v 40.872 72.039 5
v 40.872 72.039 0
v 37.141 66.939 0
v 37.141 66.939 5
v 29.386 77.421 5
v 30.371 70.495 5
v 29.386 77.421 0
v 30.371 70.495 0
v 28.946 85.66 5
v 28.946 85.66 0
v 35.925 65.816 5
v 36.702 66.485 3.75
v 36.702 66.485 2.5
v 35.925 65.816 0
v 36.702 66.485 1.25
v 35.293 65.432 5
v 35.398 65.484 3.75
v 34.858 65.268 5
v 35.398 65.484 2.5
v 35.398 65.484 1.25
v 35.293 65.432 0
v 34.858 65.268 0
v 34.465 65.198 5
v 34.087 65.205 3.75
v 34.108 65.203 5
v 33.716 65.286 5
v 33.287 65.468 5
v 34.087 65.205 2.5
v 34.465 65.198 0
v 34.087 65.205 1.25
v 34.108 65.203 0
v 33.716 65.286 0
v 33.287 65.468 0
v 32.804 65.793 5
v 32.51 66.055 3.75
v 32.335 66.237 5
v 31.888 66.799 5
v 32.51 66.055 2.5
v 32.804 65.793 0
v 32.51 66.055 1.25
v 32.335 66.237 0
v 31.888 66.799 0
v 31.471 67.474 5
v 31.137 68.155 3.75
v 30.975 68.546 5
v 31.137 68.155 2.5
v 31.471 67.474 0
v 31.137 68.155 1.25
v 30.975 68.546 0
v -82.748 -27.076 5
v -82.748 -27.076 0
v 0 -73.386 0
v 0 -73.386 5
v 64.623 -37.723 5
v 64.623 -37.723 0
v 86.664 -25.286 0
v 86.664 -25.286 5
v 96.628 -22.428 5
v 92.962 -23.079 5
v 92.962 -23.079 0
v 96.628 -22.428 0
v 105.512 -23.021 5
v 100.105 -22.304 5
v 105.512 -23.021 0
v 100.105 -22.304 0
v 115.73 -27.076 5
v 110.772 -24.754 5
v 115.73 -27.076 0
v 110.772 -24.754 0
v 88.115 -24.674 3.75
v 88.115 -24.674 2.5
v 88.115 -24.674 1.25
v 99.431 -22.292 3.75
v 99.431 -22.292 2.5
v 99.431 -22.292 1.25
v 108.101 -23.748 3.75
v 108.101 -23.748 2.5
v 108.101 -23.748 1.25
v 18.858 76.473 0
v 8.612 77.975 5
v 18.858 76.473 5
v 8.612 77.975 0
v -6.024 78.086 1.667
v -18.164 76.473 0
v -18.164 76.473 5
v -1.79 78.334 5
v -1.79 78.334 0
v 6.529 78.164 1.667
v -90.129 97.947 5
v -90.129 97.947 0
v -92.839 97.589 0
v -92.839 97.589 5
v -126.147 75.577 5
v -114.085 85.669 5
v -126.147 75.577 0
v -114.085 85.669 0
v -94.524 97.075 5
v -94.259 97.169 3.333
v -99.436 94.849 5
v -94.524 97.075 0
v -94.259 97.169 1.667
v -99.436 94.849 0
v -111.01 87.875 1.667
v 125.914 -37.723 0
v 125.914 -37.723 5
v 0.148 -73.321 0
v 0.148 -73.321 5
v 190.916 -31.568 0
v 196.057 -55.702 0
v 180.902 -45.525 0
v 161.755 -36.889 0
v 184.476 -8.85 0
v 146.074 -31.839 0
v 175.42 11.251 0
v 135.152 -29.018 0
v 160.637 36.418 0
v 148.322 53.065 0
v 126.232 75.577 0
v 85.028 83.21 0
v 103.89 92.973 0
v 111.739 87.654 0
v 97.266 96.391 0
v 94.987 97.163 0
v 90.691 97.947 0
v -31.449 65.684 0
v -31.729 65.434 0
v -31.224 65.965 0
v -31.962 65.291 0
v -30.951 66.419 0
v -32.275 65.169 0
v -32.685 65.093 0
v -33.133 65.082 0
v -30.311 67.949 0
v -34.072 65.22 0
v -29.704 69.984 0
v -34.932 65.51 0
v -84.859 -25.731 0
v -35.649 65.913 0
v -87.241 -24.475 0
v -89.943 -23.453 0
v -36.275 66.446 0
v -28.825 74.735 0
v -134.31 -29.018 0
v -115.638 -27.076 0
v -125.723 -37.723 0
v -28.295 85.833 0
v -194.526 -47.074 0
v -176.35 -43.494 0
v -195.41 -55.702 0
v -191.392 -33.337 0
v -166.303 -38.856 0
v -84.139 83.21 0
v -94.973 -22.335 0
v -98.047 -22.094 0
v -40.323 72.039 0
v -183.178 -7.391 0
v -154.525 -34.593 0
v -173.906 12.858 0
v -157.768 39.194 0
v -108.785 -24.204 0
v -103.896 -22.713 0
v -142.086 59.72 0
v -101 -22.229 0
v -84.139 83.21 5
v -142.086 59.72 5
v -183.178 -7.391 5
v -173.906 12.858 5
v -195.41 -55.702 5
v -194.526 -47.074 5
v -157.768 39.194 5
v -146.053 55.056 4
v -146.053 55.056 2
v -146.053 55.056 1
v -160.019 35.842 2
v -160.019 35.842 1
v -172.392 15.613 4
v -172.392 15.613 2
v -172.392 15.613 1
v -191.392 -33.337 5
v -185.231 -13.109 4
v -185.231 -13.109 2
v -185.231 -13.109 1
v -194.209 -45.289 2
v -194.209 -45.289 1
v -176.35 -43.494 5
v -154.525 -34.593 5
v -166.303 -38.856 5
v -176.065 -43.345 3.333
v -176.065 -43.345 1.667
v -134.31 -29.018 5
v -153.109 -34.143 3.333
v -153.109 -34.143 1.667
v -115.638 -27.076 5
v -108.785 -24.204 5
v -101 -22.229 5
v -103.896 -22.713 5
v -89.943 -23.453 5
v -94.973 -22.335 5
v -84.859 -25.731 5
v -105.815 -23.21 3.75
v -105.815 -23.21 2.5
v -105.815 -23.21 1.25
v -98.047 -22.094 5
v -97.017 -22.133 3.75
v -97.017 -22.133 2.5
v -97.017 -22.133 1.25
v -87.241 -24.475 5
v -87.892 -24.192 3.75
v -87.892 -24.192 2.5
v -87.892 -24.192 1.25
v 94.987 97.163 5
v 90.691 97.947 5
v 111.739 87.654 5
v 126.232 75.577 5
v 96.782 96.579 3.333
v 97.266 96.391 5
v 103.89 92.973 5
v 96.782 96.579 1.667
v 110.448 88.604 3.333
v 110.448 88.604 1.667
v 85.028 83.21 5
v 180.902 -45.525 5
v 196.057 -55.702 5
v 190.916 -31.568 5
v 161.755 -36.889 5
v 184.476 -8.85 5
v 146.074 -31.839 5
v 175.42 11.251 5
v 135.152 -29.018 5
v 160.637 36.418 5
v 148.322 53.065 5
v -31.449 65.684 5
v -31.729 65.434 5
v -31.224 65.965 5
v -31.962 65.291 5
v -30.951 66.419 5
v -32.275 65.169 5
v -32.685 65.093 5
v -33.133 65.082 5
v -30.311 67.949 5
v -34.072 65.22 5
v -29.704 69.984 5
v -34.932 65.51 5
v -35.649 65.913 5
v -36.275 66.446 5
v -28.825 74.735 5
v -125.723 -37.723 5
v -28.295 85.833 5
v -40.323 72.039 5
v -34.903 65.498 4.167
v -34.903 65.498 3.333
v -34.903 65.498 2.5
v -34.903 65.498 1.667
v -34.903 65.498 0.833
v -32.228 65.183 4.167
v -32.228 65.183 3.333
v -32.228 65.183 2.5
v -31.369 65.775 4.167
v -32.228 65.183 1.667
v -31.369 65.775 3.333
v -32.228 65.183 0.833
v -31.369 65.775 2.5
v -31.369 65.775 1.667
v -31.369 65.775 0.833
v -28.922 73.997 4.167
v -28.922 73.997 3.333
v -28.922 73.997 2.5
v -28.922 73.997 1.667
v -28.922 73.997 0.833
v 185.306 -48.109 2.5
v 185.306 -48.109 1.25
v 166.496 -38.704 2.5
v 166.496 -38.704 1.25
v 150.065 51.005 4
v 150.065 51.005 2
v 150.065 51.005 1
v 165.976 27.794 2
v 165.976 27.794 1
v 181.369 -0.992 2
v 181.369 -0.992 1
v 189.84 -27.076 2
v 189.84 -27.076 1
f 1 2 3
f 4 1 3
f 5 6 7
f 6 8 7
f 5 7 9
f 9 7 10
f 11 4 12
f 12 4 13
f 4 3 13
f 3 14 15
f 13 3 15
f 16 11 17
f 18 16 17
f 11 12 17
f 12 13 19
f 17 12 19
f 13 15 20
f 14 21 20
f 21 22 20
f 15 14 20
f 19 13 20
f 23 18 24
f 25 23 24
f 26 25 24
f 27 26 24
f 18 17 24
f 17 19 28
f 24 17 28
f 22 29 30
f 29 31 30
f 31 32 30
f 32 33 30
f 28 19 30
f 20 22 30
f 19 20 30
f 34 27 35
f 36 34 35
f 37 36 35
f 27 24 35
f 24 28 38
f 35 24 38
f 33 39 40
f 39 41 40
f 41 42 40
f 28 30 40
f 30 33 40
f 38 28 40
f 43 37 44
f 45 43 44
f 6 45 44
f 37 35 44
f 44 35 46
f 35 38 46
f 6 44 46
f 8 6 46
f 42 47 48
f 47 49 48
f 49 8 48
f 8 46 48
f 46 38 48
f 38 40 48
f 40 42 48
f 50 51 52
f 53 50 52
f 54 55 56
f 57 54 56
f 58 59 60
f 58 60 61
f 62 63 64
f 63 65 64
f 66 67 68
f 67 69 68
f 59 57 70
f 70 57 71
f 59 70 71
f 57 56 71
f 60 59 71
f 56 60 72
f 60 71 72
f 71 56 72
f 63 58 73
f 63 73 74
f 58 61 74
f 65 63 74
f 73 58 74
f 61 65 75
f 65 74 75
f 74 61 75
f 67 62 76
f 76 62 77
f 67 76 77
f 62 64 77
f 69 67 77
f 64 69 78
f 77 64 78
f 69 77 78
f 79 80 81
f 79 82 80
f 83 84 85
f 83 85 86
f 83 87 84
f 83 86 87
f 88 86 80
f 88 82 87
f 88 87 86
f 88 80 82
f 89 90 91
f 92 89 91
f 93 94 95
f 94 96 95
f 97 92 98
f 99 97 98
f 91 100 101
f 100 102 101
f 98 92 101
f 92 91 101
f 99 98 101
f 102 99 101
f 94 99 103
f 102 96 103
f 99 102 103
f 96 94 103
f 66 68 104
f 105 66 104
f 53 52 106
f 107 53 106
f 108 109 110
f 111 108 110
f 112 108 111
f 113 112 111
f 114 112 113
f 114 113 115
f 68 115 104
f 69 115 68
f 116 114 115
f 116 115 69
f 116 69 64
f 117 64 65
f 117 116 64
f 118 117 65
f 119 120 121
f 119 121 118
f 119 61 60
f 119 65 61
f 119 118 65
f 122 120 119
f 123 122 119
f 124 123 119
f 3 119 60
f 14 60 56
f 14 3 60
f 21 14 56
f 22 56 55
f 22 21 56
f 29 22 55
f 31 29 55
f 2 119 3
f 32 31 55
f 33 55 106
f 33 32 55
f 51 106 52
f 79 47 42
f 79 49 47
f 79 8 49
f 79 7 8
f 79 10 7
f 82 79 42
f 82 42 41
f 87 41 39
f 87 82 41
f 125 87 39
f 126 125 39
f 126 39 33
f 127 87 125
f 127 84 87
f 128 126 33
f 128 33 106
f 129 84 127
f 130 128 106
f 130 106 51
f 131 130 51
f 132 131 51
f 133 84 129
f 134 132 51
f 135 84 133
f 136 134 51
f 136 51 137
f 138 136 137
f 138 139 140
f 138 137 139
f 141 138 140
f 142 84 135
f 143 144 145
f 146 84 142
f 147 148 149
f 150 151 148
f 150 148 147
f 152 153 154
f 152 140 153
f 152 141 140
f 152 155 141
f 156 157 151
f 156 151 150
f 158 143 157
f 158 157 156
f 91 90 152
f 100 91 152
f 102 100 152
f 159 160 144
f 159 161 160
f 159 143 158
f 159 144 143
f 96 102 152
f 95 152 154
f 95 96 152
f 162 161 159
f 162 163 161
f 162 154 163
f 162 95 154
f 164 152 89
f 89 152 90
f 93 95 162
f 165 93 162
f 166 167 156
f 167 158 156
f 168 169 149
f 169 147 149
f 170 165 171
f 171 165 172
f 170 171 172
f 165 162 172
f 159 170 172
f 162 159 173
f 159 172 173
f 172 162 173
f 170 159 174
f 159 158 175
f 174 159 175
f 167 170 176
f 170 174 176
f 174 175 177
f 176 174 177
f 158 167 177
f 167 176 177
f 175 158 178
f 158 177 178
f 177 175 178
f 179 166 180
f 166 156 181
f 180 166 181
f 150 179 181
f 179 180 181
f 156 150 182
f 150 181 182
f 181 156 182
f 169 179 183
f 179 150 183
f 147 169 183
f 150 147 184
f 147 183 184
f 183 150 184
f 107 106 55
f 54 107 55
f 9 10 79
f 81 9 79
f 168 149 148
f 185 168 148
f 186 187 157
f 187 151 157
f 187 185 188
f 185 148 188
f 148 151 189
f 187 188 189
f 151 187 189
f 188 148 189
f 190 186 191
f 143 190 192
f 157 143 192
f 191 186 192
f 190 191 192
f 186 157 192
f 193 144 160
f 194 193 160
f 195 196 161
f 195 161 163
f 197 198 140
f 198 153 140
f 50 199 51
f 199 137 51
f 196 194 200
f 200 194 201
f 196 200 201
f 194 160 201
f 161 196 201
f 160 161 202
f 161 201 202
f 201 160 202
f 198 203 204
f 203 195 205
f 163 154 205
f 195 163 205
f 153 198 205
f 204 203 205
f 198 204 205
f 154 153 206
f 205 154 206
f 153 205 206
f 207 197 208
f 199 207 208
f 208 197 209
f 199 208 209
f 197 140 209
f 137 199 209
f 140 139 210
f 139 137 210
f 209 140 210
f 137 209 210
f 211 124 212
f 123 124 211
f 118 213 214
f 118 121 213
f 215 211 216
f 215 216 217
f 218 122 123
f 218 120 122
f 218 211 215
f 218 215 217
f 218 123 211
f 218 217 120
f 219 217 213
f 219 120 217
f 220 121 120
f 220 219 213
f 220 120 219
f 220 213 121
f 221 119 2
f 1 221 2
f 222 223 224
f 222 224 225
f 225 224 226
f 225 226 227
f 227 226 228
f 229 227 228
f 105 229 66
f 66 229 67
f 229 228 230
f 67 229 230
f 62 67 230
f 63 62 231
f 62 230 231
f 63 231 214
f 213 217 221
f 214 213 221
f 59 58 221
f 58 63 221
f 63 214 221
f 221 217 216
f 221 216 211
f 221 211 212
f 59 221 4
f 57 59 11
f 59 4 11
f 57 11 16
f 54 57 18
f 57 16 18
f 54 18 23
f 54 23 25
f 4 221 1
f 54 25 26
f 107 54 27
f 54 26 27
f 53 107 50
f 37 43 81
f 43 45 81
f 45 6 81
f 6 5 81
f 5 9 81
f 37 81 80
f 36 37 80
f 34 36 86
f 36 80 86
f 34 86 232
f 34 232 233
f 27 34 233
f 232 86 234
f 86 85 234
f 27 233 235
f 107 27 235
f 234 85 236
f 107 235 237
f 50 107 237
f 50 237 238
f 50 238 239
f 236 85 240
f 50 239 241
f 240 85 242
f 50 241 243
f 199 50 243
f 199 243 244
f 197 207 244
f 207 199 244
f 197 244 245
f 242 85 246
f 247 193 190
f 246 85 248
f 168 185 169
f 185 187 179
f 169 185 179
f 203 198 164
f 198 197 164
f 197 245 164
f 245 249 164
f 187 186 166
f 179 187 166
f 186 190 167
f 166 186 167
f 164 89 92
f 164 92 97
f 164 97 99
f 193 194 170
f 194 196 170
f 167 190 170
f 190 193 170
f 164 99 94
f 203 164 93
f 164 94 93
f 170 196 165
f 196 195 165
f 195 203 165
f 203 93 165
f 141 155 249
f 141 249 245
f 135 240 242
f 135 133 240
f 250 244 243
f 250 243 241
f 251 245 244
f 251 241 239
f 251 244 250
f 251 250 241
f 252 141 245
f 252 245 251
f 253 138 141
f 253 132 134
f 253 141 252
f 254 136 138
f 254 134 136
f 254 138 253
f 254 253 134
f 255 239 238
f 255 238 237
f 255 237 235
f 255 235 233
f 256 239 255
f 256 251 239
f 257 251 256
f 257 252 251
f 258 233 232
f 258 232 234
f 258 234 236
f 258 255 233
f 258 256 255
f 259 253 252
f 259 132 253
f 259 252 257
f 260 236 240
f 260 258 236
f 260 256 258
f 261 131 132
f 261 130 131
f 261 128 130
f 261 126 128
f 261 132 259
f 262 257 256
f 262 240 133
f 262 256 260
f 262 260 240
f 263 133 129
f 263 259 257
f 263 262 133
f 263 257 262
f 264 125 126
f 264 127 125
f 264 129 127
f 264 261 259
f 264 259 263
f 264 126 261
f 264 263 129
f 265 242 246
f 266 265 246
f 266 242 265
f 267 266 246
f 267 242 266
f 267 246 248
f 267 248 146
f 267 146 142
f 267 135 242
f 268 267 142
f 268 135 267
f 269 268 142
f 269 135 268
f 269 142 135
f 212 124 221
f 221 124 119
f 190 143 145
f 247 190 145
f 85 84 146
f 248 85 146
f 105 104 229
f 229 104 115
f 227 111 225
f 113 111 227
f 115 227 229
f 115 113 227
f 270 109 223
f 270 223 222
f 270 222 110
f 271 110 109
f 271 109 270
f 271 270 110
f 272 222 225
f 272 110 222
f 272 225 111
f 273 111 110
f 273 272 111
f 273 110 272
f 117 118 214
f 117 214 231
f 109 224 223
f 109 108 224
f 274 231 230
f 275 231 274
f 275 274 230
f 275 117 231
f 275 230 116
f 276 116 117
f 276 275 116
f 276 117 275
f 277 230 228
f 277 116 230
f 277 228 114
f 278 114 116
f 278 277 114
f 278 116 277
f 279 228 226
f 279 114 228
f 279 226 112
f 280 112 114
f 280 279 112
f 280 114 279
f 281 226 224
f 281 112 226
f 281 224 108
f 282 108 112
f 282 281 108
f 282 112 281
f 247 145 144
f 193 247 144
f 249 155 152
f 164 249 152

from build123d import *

# Parameters (mm, degrees)
F1_DEPTH = 5


with BuildPart() as f1:
    # F0 (on Top) → F1 (new body)
    with BuildSketch(Plane.XY):
        with BuildLine():
            add(Edge.make_bspline(
                [(90.6907990575, 97.9469045997), (92.5506797048, 97.7076608643), (97.3714835458, 97.0875419767), (111.3982823465, 88.6117833473), (121.080150162, 80.1037886779), (126.2320578098, 75.5765214562)],
                knots=[0, 0, 0, 0, 0.2271401523, 0.5887464448, 1, 1, 1, 1], degree=3))
            Line((90.6907990575, 97.9469045997), (85.0284695625, 83.2098796964))
            Line((85.0284695625, 83.2098796964), (40.8717952669, 72.0387473702))
            add(Edge.make_bspline(
                [(40.8717952669, 72.0387473702), (39.4639939865, 69.9245000162), (37.1445701485, 66.4411705287), (33.9493519923, 64.4696102192), (29.6565838044, 68.4823153989), (29.2317022817, 78.7511303066), (28.945825994, 85.6603756547)],
                knots=[0, 0, 0, 0, 0.2489757455, 0.4102001378, 0.6031604435, 1, 1, 1, 1], degree=3))
            Line((28.945825994, 85.6603756547), (18.8582092524, 76.4733627439))
            add(Edge.make_bspline(
                [(-18.1637965143, 76.4733627439), (-14.1437358291, 77.1075253303), (-6.0536026016, 78.3837398489), (6.5737675387, 78.534699391), (14.7693251616, 77.1594799333), (18.8582092524, 76.4733627439)],
                knots=[0, 0, 0, 0, 0.331071517, 0.6662617533, 1, 1, 1, 1], degree=3))
            Line((-18.1637965143, 76.4733627439), (-28.2951612025, 85.8325883746))
            add(Edge.make_bspline(
                [(-40.3230860829, 72.0387473702), (-39.088224818, 70.1720803209), (-37.0503190798, 67.0914982353), (-35.1522700417, 65.3354549205), (-31.9776770355, 64.7647193737), (-30.3977678177, 67.0311278125), (-28.4521818074, 74.4454913779), (-28.3514925601, 81.747451692), (-28.2951612025, 85.8325883746)],
                knots=[0, 0, 0, 0, 0.183795483, 0.303319798, 0.4263136272, 0.5389125099, 0.7420411316, 1, 1, 1, 1], degree=3))
            Line((-40.3230860829, 72.0387473702), (-84.1391906142, 83.2098796964))
            Line((-84.1391906142, 83.2098796964), (-90.1290997863, 97.9469045997))
            add(Edge.make_bspline(
                [(-90.1290997863, 97.9469045997), (-91.2780209136, 97.8755945292), (-94.8799122656, 97.6520359926), (-112.2832793798, 87.9203392551), (-121.5116369775, 79.7034292861), (-126.1465400457, 75.5765214562)],
                knots=[0, 0, 0, 0, 0.1890607113, 0.5927092164, 1, 1, 1, 1], degree=3))
            add(Edge.make_bspline(
                [(-126.1465400457, 75.5765214562), (-132.559519944, 69.6540069441), (-147.2325322521, 56.1031881811), (-173.7268363632, 15.3201798146), (-185.3013561139, -10.9793593897), (-194.7659689395, -44.6073790263), (-195.2399434774, -52.7711224043), (-195.410117507, -55.7022020221)],
                knots=[0, 0, 0, 0, 0.1990617008, 0.4554567194, 0.6642768347, 0.8794632215, 1, 1, 1, 1], degree=3))
            add(Edge.make_bspline(
                [(-195.410117507, -55.7022020221), (-189.2443233147, -51.3534252403), (-176.6787449134, -42.490836919), (-153.3171130308, -33.7752578796), (-140.3890181065, -30.5398782143), (-134.3097835779, -29.0184915066)],
                knots=[0, 0, 0, 0, 0.3379220853, 0.6886682111, 1, 1, 1, 1], degree=3))
            Line((-134.3097835779, -29.0184915066), (-125.7226914167, -37.7225726843))
            Line((-125.7226914167, -37.7225726843), (-115.6381219625, -27.0764511079))
            add(Edge.make_bspline(
                [(-115.6381219625, -27.0764511079), (-112.3214448117, -25.6089260502), (-105.9657828163, -22.7967460241), (-97.1811480846, -21.5375744889), (-87.7828374292, -23.7605556506), (-84.2924143647, -26.0591359078), (-82.7476084232, -27.0764511079)],
                knots=[0, 0, 0, 0, 0.2773913223, 0.5315577625, 0.7926748883, 1, 1, 1, 1], degree=3))
            Line((-82.7476084232, -27.0764511079), (0, -73.3860805631))
            Line((0, -73.3860805631), (0.147642626, -73.3210891485))
            Line((0.147642626, -73.3210891485), (64.6225735545, -37.7225726843))
            add(Edge.make_bspline(
                [(64.6225735545, -37.7225726843), (73.0666381112, -32.529493092), (87.0501240706, -23.9296825297), (99.0743607688, -21.6967578796), (108.2136687045, -23.3658879949), (113.2473852724, -25.8509101796), (115.729868412, -27.0764511079)],
                knots=[0, 0, 0, 0, 0.3591296563, 0.5947236041, 0.800129426, 1, 1, 1, 1], degree=3))
            Line((115.729868412, -27.0764511079), (125.9138733149, -37.7225726843))
            Line((125.9138733149, -37.7225726843), (135.1518183947, -29.0184915066))
            add(Edge.make_bspline(
                [(196.0572302341, -55.7022020221), (192.7366020121, -53.1840689017), (185.2187189114, -47.4830300727), (166.9431190304, -38.1587419464), (145.4004429365, -31.4769398334), (138.082034766, -29.7213941747), (135.1518183947, -29.0184915066)],
                knots=[0, 0, 0, 0, 0.2245071862, 0.508282972, 0.8031214914, 1, 1, 1, 1], degree=3))
            add(Edge.make_bspline(
                [(126.2320578098, 75.5765214562), (134.7565386666, 67.382737054), (151.0099741889, 51.7598330082), (166.021851899, 28.1874163152), (182.5105457126, -0.6670200083), (190.1905976163, -26.8526885409), (194.0803362932, -45.9807089416), (196.0572302341, -55.7022020221)],
                knots=[0, 0, 0, 0, 0.2126150187, 0.4053882641, 0.6130102113, 0.8033189805, 1, 1, 1, 1], degree=3))
        make_face()
    extrude(amount=F1_DEPTH)


solid = f1.part
